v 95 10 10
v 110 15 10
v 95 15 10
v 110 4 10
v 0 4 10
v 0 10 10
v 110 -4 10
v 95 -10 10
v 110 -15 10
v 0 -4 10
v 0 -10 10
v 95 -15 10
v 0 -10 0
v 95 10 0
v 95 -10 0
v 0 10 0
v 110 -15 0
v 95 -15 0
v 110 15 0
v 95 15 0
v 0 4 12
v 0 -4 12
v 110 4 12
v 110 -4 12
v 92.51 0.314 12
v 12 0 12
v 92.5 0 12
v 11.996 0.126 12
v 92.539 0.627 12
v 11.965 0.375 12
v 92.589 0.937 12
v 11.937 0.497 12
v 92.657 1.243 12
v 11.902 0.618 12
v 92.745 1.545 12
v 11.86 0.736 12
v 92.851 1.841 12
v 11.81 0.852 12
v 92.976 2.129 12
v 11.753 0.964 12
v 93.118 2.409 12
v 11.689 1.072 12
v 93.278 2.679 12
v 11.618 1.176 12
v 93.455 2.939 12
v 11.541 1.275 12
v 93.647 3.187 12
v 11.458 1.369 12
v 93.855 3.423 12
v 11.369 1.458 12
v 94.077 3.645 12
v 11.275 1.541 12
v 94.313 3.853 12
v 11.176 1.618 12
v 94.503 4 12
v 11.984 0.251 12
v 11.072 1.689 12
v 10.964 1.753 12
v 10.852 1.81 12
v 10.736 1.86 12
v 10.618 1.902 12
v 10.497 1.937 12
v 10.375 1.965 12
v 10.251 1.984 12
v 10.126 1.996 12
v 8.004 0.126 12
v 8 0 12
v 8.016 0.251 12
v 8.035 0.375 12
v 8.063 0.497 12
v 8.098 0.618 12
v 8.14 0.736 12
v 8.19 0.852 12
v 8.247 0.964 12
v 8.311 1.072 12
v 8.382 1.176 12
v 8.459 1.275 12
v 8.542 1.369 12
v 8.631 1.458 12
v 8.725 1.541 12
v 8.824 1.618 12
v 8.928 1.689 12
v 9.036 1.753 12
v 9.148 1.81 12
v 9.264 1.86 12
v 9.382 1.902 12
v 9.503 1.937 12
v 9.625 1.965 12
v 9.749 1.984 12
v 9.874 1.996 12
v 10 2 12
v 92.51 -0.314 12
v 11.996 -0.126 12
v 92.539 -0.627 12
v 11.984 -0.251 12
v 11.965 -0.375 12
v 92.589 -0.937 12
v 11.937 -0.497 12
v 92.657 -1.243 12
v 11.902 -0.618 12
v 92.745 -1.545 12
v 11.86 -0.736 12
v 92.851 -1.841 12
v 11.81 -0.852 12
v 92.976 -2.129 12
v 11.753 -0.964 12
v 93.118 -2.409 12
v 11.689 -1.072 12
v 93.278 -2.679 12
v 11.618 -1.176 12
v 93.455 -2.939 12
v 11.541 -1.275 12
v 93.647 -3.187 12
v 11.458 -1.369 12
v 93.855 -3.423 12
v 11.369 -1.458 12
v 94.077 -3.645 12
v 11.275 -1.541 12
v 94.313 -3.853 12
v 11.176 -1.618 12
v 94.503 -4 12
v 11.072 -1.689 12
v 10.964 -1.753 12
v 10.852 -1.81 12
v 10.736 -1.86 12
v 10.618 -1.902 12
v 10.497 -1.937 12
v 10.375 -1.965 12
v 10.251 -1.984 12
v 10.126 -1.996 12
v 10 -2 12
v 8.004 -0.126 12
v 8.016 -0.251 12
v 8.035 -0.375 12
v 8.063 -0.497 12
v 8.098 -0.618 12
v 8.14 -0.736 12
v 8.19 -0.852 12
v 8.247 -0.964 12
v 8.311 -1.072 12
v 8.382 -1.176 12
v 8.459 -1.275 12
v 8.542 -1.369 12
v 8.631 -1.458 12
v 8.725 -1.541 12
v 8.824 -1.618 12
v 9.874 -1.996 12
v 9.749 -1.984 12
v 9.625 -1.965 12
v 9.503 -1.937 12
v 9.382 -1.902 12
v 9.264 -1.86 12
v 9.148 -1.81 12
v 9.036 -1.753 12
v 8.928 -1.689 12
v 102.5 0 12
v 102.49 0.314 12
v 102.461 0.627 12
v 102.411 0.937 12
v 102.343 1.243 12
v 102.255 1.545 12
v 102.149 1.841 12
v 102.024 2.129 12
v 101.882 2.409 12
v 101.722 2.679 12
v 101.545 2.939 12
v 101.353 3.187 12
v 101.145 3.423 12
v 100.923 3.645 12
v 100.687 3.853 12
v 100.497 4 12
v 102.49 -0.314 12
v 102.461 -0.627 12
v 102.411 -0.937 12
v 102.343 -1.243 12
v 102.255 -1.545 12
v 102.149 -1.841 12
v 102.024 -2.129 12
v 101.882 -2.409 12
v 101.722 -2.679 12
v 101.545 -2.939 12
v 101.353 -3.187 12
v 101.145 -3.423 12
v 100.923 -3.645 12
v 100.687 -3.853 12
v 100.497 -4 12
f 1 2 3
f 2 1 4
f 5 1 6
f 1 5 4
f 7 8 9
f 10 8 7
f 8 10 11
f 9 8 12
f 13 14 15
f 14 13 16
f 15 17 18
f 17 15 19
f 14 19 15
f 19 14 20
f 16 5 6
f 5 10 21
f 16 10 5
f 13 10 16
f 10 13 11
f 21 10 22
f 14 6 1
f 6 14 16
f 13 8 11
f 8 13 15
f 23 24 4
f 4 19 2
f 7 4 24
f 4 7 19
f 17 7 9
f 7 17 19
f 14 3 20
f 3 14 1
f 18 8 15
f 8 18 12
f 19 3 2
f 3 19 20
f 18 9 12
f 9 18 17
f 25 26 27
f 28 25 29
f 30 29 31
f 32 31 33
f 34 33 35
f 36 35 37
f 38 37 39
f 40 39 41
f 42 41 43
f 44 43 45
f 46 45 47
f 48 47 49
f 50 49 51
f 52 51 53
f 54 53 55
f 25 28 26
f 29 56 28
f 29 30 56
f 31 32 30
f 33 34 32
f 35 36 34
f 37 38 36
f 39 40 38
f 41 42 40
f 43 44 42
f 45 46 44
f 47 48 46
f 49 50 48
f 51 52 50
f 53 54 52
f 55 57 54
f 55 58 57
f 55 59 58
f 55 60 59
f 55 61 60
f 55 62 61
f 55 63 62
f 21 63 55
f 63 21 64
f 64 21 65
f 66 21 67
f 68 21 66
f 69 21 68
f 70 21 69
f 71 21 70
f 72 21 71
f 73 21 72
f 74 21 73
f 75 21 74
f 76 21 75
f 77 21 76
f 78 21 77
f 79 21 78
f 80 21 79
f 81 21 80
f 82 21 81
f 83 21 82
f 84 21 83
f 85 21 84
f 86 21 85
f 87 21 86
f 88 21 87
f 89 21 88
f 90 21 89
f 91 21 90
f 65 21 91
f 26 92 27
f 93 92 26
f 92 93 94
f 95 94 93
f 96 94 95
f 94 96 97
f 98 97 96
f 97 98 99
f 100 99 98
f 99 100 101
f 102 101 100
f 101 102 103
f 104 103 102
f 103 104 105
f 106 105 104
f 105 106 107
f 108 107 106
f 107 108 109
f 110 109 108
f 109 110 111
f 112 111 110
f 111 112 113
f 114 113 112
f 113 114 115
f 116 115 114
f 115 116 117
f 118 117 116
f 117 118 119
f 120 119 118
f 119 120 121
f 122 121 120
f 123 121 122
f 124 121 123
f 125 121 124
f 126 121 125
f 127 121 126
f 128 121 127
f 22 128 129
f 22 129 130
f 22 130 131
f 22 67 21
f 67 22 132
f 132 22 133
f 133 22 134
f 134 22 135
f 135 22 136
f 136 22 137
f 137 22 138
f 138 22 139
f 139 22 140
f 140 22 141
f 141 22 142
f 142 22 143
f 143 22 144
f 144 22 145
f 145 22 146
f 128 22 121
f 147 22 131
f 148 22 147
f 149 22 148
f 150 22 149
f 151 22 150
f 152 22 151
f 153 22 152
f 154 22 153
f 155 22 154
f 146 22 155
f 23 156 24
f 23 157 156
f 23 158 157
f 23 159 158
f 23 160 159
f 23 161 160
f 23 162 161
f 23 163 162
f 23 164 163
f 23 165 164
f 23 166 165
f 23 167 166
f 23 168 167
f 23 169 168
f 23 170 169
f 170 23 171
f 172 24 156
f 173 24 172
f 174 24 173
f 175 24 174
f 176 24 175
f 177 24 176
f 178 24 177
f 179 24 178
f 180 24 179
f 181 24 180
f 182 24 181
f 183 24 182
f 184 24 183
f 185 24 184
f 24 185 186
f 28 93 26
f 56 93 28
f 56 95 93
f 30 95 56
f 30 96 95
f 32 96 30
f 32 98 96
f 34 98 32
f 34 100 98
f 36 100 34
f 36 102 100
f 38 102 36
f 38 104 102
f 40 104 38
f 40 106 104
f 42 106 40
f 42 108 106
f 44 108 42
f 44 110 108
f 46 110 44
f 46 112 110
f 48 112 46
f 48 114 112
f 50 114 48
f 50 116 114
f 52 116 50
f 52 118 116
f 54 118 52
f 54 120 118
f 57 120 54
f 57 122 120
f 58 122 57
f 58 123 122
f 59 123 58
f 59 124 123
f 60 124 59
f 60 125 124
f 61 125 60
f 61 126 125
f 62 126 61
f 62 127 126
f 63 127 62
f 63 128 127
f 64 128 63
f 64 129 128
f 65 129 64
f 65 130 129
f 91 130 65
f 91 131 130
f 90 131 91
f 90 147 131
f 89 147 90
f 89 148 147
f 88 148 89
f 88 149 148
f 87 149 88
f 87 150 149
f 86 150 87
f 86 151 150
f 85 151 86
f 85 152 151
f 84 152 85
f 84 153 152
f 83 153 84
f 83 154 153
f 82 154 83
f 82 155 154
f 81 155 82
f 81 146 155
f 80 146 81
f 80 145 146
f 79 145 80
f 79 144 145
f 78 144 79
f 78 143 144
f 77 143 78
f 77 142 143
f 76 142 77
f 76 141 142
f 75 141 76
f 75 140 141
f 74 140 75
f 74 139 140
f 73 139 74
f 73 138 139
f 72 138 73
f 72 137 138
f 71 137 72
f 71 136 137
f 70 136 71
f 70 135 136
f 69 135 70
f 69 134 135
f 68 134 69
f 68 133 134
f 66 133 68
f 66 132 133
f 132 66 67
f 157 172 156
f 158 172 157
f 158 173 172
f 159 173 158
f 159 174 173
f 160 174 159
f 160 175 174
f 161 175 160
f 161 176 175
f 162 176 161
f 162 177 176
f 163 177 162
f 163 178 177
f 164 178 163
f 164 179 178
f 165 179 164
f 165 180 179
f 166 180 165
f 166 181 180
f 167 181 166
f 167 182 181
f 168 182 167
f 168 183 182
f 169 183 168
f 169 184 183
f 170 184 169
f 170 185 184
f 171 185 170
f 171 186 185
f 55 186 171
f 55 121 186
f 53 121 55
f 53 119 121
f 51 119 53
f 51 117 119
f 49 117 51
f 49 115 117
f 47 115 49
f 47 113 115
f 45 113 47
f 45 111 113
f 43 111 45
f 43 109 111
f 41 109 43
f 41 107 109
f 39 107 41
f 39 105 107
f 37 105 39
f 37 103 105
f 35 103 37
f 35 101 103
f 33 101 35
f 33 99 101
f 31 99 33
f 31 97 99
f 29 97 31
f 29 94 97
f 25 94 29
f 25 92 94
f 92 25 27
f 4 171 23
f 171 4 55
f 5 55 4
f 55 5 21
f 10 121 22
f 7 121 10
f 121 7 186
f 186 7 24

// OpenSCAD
// Parametric rail with extension block, top strip, and various recess cuts

// Main rail dimensions
rail_body_length = 100;   // length of the main rail body
rail_width = 20;          // width of the rail body
rail_height = 10;         // height of the main rail body

// Top layer dimensions (shallow, narrow)
top_thickness = 2;        // thickness of the top strip
top_width = 8;            // width of the top strip (narrower than rail)

// Extension block parameters
ext_length = 15;          // length of the wider extension block
ext_width = 30;           // width of the extension (wider than rail)
overlap = 5;              // distance the block overlaps the rail body
total_length = rail_body_length + ext_length - overlap; // overall part length

// Circular recess parameters
small_recess_dia = 4;       // diameter of small recesses at rail ends
small_recess_depth = top_thickness + 1; // recess depth (into top strip + 1mm into body)
large_recess_dia = 10;      // diameter of large shallow recess on extension
large_recess_depth = top_thickness + 2; // depth of large recess (into body)
deep_hole_dia = 5;          // diameter of the deep through cutout

// Positioning
recess_from_end = 10;       // distance from each end to the small recesses
large_recess_center_x = rail_body_length - overlap/2; // center of the overlapping area

$fn = 100; // resolution for circles

// Main solid body (rail + extension + top strip)
module main_assembly() {
    union() {
        // Main rail body, centered along Y and positioned on Z bottom
        translate([rail_body_length/2, 0, rail_height/2])
            cube([rail_body_length, rail_width, rail_height], center = true);
        // Extension block body, overlapping the rail end
        translate([rail_body_length - overlap + ext_length/2, 0, rail_height/2])
            cube([ext_length, ext_width, rail_height], center = true);
        // Continuous top strip across the full length
        translate([total_length/2, 0, rail_height + top_thickness/2])
            cube([total_length, top_width, top_thickness], center = true);
    }
}

// Subtractive features (recesses and deep hole)
module cutouts() {
    // Small circular recess near left end of top strip
    translate([recess_from_end, 0, rail_height + top_thickness])
        cylinder(h = small_recess_depth, d = small_recess_dia, center = false);
    // Small circular recess near right end of top strip
    translate([total_length - recess_from_end, 0, rail_height + top_thickness])
        cylinder(h = small_recess_depth, d = small_recess_dia, center = false);
    // Large shallow recess at the overlap area on the extension
    translate([large_recess_center_x, 0, rail_height + top_thickness])
        cylinder(h = large_recess_depth, d = large_recess_dia, center = false);
    // Deep through hole from top surface through the block and rail body
    translate([large_recess_center_x, 0, rail_height + top_thickness])
        cylinder(h = rail_height + top_thickness, d = deep_hole_dia, center = false);
}

// Final part
difference() {
    main_assembly();
    cutouts();
}
